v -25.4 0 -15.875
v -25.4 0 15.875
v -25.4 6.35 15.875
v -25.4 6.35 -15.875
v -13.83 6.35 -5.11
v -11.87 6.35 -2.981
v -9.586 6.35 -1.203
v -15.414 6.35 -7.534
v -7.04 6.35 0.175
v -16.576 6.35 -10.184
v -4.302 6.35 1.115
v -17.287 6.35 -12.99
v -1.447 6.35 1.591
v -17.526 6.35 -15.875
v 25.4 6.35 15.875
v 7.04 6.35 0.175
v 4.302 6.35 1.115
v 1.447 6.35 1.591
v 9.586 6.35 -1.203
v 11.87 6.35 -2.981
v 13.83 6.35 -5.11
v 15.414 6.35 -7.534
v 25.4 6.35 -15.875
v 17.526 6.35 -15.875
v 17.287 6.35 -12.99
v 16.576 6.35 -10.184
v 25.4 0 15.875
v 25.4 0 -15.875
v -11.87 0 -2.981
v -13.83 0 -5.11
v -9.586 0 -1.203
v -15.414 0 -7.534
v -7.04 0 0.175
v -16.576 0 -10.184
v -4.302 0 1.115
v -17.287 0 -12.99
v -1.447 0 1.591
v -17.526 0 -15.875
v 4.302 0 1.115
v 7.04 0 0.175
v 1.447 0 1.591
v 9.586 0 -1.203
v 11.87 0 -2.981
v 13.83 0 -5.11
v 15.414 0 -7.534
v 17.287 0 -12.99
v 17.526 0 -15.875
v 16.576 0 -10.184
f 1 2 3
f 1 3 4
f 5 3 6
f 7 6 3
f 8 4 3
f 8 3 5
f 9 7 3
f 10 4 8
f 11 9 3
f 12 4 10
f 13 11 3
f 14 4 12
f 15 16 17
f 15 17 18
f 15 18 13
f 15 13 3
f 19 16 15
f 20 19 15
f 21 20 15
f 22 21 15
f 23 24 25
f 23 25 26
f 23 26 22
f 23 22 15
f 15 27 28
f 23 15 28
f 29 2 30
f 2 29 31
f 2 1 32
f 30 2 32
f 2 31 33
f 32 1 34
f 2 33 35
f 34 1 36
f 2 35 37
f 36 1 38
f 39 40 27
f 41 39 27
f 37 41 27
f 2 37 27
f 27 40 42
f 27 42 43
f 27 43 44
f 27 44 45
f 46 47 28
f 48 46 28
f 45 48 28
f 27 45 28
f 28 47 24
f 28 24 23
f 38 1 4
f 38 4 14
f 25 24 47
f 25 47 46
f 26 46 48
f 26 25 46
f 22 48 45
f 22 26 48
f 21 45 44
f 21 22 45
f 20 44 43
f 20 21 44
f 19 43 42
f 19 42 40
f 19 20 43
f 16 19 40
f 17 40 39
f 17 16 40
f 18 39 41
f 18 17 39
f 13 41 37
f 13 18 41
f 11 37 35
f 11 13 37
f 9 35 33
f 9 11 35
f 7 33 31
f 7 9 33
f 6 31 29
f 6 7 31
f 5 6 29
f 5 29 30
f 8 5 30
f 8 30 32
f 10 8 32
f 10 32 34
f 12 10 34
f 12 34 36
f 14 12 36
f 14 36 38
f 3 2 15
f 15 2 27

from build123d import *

# Parameters (mm, degrees)
SKETCH1_W           = 50.8
SKETCH1_H           = 31.75
BOSS_EXTRUDE1_DEPTH = 6.35
CUT_EXTRUDE1_DEPTH  = 6.35


with BuildPart() as part:
    # Sketch1 → Boss-Extrude1 (new body)
    with BuildSketch(Plane(origin=(0, 0, 0), x_dir=(1, 0, 0), z_dir=(0, 1, 0))):
        Rectangle(SKETCH1_W, SKETCH1_H)
    extrude(amount=BOSS_EXTRUDE1_DEPTH)

    # Sketch2 → Cut-Extrude1 (cut)
    with BuildSketch(Plane(origin=(0, 6.35, 0), x_dir=(1, 0, 0), z_dir=(0, 1, 0))):
        with BuildLine():
            Line((-17.526, 15.875), (17.526, 15.875))
            ThreePointArc((17.526, 15.875), (0, -1.651), (-17.526, 15.875))
        make_face()
    extrude(amount=-CUT_EXTRUDE1_DEPTH, mode=Mode.SUBTRACT)


solid = part.part
